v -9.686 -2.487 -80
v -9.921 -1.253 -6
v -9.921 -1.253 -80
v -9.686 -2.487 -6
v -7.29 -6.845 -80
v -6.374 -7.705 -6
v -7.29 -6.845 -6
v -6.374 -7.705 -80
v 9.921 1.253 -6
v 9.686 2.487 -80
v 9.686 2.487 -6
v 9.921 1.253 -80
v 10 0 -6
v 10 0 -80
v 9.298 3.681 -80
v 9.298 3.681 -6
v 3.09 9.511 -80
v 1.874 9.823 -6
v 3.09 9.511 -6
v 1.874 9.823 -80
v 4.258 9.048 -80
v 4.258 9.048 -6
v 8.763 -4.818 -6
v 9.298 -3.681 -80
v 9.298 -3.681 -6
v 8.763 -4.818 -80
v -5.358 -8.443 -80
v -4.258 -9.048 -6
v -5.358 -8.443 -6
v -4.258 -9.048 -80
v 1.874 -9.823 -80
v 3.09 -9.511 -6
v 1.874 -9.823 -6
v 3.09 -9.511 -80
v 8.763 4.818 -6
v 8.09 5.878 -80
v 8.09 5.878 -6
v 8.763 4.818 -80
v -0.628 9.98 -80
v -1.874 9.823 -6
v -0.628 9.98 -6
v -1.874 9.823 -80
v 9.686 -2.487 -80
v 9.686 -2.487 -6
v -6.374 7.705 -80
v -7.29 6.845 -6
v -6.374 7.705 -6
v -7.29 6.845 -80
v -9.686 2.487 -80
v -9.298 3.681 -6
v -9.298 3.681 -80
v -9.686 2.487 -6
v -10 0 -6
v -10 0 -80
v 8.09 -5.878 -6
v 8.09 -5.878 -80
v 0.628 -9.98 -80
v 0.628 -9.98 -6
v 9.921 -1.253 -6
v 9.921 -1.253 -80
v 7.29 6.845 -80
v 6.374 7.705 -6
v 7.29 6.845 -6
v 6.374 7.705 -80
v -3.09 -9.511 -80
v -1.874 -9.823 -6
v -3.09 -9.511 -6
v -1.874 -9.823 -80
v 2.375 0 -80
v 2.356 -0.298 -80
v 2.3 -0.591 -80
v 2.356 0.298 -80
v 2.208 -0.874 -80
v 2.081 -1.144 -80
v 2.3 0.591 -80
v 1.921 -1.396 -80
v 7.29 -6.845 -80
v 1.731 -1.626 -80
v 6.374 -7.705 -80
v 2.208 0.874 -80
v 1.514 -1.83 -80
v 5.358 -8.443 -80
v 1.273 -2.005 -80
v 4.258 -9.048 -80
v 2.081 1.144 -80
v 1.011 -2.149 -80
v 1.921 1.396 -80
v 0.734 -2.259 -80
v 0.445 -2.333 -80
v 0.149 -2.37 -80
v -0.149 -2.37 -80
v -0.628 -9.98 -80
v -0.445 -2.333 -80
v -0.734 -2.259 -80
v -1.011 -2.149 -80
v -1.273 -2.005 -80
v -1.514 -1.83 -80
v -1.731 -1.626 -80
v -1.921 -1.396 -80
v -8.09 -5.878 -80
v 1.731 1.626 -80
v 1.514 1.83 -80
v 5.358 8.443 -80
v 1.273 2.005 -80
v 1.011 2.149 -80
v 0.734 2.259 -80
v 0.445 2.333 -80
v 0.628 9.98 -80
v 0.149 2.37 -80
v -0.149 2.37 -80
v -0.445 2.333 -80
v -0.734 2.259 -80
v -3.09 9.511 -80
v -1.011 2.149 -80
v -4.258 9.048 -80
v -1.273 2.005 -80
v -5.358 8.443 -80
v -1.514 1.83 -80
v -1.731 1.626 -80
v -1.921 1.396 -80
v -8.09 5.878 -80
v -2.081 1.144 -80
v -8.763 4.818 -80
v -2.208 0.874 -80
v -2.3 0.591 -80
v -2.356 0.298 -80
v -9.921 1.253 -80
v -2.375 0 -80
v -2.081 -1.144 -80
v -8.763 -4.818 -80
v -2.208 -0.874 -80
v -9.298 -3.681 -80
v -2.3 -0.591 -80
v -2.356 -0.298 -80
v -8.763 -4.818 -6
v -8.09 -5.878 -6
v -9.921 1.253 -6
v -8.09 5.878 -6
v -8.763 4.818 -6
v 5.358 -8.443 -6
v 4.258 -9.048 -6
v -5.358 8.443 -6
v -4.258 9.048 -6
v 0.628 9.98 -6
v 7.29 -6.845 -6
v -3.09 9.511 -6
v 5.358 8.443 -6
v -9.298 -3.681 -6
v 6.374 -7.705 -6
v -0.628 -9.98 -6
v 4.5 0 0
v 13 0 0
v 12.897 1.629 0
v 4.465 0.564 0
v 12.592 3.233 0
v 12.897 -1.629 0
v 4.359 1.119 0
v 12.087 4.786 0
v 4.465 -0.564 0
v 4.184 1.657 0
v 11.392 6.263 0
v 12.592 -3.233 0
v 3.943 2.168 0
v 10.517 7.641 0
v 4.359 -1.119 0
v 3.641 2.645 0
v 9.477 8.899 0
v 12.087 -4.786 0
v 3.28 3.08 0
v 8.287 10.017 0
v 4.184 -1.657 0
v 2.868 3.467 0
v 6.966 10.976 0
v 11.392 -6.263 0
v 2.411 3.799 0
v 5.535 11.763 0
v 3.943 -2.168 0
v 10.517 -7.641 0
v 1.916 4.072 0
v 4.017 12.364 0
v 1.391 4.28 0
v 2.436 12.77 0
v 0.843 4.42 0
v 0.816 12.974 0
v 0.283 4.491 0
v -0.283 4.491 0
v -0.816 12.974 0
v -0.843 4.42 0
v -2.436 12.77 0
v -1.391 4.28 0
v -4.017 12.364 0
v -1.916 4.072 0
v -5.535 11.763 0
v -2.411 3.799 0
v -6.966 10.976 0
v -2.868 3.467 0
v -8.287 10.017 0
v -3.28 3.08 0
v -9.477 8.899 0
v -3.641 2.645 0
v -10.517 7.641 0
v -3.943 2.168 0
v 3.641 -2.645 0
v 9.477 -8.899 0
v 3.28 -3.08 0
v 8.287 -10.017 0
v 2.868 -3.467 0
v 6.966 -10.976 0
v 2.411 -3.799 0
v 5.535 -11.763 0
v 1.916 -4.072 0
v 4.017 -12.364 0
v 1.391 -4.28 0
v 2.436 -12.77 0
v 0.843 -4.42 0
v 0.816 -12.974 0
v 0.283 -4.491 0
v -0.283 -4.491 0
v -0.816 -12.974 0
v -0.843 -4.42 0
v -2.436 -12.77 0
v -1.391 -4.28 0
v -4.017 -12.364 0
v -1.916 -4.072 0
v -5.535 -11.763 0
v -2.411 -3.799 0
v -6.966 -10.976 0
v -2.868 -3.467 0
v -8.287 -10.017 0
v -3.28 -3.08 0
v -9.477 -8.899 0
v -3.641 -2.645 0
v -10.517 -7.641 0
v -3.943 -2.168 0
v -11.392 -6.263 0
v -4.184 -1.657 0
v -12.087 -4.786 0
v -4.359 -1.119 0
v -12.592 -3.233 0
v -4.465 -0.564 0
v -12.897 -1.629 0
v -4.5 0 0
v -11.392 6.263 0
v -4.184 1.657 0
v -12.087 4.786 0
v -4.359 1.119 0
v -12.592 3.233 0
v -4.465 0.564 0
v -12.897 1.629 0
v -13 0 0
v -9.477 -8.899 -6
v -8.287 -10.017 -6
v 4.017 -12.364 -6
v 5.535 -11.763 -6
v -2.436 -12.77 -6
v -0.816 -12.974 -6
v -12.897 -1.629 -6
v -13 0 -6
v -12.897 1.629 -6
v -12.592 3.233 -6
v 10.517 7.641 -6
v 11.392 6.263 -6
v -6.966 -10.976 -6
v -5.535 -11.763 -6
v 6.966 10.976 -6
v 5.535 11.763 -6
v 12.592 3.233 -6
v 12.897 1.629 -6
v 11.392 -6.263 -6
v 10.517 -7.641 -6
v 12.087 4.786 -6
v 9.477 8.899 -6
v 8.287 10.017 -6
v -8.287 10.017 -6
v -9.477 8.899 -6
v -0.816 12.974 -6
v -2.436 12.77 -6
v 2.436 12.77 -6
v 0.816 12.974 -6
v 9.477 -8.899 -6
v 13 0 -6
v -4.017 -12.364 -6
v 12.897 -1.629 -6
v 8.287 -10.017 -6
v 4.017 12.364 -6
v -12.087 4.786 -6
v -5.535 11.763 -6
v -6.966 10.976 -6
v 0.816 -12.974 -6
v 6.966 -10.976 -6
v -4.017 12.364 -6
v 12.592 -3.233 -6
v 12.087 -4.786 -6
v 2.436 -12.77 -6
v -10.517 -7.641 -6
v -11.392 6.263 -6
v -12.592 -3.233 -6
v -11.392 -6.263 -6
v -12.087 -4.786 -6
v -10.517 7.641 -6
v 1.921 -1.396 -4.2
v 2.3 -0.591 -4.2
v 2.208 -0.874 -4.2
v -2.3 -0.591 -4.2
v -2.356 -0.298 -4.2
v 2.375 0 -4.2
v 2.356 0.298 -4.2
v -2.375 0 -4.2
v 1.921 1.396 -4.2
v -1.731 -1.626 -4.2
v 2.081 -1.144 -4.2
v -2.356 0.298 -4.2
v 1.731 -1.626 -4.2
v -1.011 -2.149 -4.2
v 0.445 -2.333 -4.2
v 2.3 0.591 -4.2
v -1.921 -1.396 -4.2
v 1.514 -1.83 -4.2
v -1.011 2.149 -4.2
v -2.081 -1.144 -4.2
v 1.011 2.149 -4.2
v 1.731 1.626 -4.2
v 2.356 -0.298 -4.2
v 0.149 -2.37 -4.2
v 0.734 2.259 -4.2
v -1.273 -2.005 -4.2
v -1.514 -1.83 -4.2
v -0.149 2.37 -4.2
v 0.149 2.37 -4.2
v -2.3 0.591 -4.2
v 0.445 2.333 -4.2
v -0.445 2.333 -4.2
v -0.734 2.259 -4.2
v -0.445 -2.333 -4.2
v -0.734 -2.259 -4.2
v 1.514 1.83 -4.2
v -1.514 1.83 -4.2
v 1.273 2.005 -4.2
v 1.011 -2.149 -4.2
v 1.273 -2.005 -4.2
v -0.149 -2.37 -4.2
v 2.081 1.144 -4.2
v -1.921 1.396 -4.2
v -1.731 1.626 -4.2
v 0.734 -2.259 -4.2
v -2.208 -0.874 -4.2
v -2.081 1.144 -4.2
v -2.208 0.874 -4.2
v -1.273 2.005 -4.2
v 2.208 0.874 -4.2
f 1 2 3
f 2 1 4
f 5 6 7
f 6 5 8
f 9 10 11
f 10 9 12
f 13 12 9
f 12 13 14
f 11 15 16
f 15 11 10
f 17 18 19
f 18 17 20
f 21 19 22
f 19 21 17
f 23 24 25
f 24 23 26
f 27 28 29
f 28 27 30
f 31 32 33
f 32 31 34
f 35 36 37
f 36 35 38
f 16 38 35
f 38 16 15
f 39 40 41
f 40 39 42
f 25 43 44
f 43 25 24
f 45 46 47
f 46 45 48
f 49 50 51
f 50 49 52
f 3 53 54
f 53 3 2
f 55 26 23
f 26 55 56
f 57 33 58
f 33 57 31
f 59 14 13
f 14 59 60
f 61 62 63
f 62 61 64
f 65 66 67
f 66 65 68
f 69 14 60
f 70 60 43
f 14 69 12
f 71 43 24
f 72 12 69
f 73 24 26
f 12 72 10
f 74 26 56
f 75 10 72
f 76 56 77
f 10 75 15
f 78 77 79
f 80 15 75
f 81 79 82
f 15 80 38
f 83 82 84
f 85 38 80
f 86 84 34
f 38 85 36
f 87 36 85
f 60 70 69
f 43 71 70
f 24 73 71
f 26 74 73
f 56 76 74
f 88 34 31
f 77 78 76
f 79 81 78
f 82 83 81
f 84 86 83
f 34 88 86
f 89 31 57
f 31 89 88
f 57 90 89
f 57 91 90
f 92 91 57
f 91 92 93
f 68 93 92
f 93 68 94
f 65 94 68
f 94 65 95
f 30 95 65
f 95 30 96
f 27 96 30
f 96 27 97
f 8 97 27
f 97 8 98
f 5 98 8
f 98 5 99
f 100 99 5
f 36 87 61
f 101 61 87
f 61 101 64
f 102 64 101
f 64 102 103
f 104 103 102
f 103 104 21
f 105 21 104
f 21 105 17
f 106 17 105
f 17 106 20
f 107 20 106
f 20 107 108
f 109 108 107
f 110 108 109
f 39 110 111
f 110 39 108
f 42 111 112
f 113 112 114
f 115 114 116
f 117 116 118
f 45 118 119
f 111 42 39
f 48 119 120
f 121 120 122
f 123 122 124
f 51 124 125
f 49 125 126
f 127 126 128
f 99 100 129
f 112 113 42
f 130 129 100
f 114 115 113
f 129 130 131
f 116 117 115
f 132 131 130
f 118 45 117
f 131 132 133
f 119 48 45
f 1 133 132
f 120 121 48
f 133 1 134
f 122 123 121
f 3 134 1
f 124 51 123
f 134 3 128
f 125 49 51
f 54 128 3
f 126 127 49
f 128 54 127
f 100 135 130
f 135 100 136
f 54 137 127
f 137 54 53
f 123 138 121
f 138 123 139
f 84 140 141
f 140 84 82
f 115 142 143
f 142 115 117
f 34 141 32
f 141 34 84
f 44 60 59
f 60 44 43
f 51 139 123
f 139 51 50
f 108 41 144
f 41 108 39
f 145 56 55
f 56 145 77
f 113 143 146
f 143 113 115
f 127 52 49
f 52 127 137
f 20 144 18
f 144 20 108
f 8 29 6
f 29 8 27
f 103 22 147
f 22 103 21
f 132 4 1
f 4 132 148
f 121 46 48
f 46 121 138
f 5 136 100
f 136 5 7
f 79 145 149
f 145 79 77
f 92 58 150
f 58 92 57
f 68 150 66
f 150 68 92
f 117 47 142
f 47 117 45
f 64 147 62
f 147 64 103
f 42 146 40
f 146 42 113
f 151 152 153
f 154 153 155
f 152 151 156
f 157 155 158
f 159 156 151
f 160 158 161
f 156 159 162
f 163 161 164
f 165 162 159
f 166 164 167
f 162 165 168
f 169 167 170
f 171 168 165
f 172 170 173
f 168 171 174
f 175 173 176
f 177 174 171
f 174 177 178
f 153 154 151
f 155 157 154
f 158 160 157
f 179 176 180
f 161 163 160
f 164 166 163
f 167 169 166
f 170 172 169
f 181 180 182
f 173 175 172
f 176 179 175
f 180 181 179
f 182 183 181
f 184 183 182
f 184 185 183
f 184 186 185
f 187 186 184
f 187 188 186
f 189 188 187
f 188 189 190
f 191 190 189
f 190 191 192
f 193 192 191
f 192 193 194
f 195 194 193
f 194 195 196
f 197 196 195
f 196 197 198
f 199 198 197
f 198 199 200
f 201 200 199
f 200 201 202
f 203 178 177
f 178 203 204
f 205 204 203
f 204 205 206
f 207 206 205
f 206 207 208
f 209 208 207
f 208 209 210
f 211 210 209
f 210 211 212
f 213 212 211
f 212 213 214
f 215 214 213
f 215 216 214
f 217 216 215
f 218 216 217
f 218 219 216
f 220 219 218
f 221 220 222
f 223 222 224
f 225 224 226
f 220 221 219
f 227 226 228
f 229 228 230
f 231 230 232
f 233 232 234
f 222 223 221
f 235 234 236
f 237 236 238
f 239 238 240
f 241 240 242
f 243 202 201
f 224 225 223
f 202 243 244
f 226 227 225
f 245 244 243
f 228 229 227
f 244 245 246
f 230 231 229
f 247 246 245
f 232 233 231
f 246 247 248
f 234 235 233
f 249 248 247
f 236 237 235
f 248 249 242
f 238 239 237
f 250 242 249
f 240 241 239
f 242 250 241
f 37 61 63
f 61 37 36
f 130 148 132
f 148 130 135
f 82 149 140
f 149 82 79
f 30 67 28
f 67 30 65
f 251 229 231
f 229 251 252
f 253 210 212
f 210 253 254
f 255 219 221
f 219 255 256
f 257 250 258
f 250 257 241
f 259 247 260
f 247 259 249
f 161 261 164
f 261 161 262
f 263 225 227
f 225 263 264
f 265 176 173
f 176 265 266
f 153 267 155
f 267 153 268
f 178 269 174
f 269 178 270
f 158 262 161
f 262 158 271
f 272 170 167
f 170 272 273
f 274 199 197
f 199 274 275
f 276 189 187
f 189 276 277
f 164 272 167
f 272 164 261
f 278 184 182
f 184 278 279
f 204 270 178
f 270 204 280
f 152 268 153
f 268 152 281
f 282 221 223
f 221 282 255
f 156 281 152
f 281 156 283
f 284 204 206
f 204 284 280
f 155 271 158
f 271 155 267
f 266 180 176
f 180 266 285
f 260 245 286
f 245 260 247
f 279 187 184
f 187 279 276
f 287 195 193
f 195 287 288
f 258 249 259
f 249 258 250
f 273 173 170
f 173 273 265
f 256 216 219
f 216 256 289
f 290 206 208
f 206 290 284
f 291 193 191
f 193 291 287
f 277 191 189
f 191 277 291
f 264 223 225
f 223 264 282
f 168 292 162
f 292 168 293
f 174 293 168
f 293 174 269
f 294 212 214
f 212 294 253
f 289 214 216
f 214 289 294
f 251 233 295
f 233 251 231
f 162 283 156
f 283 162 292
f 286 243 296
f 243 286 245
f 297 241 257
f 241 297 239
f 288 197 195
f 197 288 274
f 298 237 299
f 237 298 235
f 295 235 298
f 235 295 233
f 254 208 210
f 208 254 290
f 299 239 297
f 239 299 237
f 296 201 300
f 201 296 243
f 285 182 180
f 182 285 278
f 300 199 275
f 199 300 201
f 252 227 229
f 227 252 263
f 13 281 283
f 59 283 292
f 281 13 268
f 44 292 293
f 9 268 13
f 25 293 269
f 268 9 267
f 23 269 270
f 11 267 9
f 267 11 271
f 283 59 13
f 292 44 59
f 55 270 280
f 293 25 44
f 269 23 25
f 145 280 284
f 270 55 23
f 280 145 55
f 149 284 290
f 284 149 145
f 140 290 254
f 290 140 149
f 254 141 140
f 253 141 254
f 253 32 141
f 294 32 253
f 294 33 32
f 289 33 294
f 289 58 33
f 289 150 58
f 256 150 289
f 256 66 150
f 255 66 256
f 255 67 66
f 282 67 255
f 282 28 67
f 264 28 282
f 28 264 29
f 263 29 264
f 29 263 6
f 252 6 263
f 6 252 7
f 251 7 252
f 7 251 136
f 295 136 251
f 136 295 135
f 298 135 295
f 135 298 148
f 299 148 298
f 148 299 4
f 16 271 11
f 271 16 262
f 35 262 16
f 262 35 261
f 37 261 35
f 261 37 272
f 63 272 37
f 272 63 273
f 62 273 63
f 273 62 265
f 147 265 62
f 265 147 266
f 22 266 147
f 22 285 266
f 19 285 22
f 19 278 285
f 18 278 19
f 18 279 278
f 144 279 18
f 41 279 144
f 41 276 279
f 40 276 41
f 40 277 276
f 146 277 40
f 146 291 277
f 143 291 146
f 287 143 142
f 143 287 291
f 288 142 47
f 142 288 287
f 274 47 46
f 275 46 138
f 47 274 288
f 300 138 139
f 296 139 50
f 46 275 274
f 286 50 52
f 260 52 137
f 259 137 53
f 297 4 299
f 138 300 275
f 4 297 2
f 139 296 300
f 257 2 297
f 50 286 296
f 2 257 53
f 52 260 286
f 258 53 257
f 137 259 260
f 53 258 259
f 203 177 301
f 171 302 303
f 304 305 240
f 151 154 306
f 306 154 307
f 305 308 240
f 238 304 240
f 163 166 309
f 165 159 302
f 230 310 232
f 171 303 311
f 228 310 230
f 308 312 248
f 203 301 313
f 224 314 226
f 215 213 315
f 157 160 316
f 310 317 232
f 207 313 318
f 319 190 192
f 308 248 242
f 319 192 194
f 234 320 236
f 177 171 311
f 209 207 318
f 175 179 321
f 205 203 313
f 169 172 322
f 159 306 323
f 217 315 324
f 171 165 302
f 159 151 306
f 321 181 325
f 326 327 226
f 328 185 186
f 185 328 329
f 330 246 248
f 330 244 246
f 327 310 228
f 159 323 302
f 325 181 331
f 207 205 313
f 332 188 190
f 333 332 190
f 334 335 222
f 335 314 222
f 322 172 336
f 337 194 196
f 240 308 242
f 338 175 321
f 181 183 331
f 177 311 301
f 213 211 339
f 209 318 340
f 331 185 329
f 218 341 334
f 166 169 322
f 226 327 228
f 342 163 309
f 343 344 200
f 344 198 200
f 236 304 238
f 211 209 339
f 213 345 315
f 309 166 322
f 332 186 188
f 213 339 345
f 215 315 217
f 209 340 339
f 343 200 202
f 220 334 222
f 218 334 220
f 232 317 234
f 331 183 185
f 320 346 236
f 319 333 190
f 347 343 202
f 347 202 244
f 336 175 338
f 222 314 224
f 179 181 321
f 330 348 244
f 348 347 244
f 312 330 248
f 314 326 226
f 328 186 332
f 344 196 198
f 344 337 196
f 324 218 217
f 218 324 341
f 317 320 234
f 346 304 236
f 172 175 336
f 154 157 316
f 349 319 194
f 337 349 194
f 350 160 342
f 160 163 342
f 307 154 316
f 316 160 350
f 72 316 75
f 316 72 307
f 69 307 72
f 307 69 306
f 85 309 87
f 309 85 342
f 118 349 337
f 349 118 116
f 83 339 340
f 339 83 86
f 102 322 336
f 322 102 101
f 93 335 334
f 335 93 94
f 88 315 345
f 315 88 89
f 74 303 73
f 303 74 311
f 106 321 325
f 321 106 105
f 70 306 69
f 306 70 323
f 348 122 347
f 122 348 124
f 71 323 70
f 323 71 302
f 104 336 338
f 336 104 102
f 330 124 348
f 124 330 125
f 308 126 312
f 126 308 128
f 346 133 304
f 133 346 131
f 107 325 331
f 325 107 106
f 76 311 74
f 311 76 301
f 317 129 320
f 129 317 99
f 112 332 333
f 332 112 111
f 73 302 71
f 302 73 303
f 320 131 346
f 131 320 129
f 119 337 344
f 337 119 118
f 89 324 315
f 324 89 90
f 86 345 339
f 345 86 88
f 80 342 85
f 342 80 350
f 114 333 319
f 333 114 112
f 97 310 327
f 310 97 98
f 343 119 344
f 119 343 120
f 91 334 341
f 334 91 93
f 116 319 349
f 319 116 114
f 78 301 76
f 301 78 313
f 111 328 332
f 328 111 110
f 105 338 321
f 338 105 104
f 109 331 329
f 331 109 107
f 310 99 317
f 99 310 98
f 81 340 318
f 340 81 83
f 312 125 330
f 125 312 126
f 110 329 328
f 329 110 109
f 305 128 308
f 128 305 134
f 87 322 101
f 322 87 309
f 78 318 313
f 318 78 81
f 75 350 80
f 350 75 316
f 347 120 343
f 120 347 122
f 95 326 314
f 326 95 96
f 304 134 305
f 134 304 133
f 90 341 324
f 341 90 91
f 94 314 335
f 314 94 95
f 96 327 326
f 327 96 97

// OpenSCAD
$fn = 50;


difference() {
	union() {
		translate(v = [0, 0, -80.0000000000]) {
			cylinder(h = 80, r = 10.0000000000);
		}
		translate(v = [0, 0, -6.0000000000]) {
			cylinder(h = 6, r = 13.0000000000);
		}
	}
	union() {
		translate(v = [0, 0, 0]) {
			rotate(a = [0, 0, 0]) {
				difference() {
					union() {
						#translate(v = [0, 0, -80.0000000000]) {
							cylinder(h = 80, r = 2.2500000000);
						}
						#translate(v = [0, 0, -4.2000000000]) {
							cylinder(h = 4.2000000000, r1 = 2.3750000000, r2 = 4.5000000000);
						}
						#translate(v = [0, 0, -80.0000000000]) {
							cylinder(h = 80, r = 2.3750000000);
						}
						#translate(v = [0, 0, -80.0000000000]) {
							cylinder(h = 80, r = 2.2500000000);
						}
					}
					union();
				}
			}
		}
	}
}
